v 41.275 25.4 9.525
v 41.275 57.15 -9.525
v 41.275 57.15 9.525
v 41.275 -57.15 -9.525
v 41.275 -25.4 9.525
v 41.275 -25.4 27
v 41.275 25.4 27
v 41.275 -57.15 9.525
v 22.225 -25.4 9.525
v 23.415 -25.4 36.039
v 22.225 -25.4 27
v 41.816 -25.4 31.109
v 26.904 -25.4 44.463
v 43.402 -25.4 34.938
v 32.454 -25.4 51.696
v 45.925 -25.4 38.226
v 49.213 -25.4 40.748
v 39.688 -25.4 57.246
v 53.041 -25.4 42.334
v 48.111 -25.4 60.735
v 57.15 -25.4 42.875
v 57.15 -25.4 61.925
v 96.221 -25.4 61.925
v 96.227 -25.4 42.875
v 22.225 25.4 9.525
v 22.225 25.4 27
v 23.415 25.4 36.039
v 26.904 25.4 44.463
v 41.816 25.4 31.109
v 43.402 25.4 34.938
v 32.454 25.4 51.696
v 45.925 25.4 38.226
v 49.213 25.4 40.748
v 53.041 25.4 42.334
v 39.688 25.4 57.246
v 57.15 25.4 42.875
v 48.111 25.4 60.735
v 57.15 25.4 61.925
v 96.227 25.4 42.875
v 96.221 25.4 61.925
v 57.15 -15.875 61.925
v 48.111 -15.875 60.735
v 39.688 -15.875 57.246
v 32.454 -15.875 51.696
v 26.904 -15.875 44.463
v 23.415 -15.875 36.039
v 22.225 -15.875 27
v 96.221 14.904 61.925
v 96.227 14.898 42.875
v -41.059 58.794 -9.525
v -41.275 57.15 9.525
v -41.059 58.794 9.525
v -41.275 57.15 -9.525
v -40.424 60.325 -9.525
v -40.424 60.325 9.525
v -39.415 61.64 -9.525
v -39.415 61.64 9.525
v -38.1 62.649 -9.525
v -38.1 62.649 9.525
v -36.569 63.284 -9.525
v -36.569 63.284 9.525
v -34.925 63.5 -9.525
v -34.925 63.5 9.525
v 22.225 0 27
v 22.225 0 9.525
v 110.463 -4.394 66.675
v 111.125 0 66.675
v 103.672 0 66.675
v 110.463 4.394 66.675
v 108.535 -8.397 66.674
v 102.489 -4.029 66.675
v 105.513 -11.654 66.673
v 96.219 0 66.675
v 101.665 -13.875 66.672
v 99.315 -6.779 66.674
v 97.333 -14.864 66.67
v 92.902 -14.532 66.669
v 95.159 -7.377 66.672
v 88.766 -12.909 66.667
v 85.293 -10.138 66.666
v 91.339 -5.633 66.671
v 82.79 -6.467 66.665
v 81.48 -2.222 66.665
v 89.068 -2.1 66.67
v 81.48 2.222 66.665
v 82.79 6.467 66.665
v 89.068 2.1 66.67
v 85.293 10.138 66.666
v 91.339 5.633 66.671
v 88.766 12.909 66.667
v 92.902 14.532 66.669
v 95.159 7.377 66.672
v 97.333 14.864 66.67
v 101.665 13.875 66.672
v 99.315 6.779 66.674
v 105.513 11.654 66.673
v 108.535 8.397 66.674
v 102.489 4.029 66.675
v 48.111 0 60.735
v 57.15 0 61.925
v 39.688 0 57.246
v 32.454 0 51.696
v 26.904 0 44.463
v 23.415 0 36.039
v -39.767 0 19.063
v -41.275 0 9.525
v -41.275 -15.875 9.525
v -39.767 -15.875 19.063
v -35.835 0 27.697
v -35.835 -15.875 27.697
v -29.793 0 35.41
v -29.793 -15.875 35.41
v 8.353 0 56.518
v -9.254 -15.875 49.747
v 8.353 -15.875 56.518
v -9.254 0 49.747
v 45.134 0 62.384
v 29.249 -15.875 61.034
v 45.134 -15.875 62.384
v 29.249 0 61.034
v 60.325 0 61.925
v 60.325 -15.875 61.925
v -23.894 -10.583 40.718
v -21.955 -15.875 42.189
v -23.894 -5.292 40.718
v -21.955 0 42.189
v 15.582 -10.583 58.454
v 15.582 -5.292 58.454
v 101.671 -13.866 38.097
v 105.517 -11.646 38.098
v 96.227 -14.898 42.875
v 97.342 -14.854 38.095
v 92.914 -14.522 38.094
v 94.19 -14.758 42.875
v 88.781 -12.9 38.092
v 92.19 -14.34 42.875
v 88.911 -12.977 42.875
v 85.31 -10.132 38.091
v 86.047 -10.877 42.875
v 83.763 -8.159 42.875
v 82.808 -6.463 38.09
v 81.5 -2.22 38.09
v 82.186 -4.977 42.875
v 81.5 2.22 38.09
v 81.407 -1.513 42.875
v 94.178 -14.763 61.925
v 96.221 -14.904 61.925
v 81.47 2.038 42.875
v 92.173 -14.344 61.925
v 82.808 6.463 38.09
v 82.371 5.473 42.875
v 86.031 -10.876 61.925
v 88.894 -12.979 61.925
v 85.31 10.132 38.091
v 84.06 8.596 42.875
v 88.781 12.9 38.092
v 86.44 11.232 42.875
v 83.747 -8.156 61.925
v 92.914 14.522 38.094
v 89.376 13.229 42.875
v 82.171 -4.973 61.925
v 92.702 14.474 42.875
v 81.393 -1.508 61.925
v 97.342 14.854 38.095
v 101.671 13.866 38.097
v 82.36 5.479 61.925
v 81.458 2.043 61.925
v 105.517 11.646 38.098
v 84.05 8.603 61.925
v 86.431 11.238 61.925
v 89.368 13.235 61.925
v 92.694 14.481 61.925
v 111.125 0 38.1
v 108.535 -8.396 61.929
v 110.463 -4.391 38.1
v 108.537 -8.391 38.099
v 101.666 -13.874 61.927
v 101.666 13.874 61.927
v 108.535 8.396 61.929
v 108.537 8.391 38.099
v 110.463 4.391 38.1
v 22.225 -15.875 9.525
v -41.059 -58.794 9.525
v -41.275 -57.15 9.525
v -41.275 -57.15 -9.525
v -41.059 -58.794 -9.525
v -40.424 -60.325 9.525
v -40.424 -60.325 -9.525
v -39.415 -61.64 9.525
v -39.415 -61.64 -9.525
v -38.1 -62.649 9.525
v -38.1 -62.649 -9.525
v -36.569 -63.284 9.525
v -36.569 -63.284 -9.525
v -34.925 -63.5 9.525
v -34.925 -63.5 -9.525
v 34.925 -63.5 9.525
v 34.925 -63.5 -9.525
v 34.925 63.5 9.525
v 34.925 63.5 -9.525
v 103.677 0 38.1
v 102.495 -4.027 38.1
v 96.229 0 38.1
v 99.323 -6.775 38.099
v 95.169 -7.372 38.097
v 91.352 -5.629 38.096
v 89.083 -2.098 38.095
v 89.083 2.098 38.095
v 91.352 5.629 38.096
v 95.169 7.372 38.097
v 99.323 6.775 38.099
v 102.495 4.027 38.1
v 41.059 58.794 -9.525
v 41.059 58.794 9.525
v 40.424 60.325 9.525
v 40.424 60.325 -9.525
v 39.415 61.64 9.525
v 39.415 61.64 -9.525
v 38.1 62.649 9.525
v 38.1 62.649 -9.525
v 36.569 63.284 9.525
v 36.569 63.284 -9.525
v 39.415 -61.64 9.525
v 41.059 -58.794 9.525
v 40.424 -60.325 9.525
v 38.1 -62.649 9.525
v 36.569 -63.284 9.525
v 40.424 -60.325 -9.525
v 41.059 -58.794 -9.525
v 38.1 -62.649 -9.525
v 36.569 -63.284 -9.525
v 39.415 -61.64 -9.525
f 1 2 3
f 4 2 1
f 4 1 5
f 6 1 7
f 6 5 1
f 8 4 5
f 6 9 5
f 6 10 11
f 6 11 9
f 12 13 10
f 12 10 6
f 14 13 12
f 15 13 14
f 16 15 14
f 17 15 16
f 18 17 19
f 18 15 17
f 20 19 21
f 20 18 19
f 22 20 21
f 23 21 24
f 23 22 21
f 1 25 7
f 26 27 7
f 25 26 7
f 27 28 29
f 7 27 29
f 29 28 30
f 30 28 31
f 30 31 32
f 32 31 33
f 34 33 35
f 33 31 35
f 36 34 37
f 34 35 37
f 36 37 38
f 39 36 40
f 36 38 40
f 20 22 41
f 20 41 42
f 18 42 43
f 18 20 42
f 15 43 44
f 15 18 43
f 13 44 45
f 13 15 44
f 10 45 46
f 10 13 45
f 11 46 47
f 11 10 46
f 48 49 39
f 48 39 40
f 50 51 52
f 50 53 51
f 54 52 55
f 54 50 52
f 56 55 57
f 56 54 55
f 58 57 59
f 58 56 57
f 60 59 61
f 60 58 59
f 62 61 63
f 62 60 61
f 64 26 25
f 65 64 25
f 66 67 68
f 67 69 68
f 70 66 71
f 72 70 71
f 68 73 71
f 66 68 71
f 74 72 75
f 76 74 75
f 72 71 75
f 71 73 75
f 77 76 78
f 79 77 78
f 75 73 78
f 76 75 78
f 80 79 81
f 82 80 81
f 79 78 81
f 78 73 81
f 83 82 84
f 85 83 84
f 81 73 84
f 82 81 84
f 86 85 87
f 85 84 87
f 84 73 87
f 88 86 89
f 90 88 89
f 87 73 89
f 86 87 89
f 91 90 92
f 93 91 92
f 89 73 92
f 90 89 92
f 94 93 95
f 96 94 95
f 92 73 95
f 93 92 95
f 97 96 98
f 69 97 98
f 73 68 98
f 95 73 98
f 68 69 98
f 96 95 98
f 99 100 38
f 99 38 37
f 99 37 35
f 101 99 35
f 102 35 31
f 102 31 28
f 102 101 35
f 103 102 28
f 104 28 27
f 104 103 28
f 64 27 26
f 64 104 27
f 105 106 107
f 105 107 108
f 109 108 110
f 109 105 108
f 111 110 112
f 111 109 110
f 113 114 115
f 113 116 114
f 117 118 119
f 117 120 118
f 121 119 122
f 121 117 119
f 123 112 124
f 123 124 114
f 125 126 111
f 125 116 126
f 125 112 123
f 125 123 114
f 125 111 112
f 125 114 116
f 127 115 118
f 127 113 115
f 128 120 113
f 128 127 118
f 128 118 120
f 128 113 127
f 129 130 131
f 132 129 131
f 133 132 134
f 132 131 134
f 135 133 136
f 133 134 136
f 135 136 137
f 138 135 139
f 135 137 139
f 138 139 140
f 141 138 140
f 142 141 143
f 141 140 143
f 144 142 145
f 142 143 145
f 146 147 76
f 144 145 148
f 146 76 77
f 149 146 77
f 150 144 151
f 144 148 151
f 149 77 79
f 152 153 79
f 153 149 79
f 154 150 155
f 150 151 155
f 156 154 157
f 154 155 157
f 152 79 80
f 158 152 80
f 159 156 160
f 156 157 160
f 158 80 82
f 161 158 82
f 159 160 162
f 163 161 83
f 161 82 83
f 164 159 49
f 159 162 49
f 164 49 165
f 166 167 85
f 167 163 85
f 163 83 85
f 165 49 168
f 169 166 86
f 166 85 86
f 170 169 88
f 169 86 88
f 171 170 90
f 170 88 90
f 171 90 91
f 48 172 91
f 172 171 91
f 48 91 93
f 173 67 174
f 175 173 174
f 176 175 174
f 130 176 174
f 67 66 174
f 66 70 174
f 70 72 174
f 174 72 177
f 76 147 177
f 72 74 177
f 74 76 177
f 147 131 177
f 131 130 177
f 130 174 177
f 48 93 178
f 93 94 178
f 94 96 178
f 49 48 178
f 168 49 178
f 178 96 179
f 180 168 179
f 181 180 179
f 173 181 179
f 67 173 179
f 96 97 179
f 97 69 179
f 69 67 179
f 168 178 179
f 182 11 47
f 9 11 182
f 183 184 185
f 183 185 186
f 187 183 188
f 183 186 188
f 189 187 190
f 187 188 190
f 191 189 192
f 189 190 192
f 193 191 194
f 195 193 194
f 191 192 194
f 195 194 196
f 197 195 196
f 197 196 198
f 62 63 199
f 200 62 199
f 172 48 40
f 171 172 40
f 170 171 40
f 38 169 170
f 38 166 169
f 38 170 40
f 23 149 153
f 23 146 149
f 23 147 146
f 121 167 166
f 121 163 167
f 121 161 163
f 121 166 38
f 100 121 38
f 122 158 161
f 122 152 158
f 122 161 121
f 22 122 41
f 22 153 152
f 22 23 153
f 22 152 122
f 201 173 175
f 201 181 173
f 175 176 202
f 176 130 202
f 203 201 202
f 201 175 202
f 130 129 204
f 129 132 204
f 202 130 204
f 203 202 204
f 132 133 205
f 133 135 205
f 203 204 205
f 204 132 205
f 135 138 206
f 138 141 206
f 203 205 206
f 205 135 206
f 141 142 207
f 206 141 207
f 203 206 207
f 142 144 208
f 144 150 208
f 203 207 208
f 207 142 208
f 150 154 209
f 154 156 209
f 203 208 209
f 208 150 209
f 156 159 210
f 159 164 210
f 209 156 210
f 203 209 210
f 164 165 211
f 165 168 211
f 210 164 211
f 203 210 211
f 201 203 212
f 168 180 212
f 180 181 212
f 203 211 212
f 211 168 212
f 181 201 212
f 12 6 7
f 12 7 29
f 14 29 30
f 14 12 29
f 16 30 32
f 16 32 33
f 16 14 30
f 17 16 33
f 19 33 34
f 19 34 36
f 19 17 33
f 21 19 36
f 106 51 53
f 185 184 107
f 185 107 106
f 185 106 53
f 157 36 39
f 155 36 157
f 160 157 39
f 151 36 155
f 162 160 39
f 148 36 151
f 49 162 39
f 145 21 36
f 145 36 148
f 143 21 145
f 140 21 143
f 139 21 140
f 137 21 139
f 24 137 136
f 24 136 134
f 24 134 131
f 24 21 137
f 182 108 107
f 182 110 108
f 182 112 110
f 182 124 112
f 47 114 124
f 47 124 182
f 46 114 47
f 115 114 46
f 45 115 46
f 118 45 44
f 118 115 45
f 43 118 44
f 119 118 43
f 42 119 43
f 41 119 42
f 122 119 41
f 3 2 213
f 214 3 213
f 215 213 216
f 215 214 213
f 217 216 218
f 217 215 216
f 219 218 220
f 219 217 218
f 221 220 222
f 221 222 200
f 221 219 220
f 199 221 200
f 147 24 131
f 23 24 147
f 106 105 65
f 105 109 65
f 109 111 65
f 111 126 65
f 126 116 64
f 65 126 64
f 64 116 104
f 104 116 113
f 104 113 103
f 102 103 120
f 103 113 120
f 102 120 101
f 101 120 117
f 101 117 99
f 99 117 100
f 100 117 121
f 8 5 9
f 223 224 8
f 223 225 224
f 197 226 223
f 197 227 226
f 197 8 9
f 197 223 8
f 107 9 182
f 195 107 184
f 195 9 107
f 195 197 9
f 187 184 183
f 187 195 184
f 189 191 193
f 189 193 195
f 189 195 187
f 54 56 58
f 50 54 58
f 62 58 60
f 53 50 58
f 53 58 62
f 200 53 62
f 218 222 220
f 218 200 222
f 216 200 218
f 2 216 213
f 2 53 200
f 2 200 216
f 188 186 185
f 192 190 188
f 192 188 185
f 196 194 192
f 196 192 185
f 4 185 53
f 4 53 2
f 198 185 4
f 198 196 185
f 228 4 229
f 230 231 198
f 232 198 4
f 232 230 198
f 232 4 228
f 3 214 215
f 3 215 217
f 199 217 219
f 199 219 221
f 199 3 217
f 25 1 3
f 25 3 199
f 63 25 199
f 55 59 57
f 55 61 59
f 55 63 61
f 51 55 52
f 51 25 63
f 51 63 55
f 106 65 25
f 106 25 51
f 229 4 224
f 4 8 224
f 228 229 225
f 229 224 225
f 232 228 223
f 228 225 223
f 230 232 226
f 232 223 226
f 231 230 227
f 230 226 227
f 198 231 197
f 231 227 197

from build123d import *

# Parameters (mm, degrees)
F1_DEPTH = 63.5
F2_DEPTH = 25.4
F3_DEPTH = 15.875
F5_R     = 6.35


with BuildPart() as f1:
    # F0 (on Front) → F1 (new body, symmetric)
    with BuildSketch(Plane.XZ):
        Polygon((41.275, -9.525), (41.275, 9.525), (22.225, 9.525), (-41.275, 9.525), (-41.275, -9.525), align=None)
    extrude(amount=F1_DEPTH, both=True)

    # F0 (on Front) → F2 (join, symmetric)
    with BuildSketch(Plane.XZ):
        with BuildLine():
            Line((22.225, 9.525), (41.275, 9.525))
            Line((41.275, 9.525), (41.275, 27.0002))
            ThreePointArc((41.275, 27.0002), (45.9246798487, 38.2255201513), (57.15, 42.8752))
            Line((57.15, 42.8752), (60.325, 42.8752))
            Line((60.325, 42.8752), (60.325, 61.9252))
            Line((60.325, 61.9252), (57.15, 61.9252))
            ThreePointArc((57.15, 61.9252), (32.4542956671, 51.6959043329), (22.225, 27.0002))
            Line((22.225, 27.0002), (22.225, 9.525))
        make_face()
        Polygon((96.2208863549, 61.9252), (60.325, 61.9252), (60.325, 42.8752), (96.2274231248, 42.8752), align=None)
    extrude(amount=F2_DEPTH, both=True)

    # F0 (on Front) → F3 (join)
    with BuildSketch(Plane.XZ):
        with BuildLine():
            Line((-41.275, 9.525), (22.225, 9.525))
            Line((22.225, 9.525), (22.225, 27.0002))
            ThreePointArc((22.225, 27.0002), (32.4542956671, 51.6959043329), (57.15, 61.9252))
            Line((57.15, 61.9252), (60.325, 61.9252))
            add(Edge.make_bspline(
                [(-41.275, 9.525), (-40.5514836311, 47.1779592335), (18.5578372329, 65.8548623323), (60.325, 61.9252)],
                knots=[0, 0, 0, 0, 114.3168446032, 114.3168446032, 114.3168446032, 114.3168446032], degree=3))
        make_face()
    extrude(amount=F3_DEPTH)

    # F0 (on Front) → F4 (revolve)
    with BuildSketch(Plane.XZ):
        Polygon((96.2192565203, 66.675), (96.2208863549, 61.9252), (96.2274231248, 42.8752), (96.2290616752, 38.1), (111.125, 38.1), (111.125, 66.675), align=None)
    revolve(axis=Axis((96.2241590977, 0, 52.3875), (0.0003431375, 0, -0.9999999411)))

    # F5
    f5_edges = [f1.edges().sort_by_distance(p)[0] for p in [
        (41.275, -63.5, 0),
        (-41.275, -63.5, 0),
        (-41.275, 63.5, 0),
        (41.275, 63.5, 0),
    ]]
    fillet(f5_edges, radius=F5_R)


solid = f1.part
